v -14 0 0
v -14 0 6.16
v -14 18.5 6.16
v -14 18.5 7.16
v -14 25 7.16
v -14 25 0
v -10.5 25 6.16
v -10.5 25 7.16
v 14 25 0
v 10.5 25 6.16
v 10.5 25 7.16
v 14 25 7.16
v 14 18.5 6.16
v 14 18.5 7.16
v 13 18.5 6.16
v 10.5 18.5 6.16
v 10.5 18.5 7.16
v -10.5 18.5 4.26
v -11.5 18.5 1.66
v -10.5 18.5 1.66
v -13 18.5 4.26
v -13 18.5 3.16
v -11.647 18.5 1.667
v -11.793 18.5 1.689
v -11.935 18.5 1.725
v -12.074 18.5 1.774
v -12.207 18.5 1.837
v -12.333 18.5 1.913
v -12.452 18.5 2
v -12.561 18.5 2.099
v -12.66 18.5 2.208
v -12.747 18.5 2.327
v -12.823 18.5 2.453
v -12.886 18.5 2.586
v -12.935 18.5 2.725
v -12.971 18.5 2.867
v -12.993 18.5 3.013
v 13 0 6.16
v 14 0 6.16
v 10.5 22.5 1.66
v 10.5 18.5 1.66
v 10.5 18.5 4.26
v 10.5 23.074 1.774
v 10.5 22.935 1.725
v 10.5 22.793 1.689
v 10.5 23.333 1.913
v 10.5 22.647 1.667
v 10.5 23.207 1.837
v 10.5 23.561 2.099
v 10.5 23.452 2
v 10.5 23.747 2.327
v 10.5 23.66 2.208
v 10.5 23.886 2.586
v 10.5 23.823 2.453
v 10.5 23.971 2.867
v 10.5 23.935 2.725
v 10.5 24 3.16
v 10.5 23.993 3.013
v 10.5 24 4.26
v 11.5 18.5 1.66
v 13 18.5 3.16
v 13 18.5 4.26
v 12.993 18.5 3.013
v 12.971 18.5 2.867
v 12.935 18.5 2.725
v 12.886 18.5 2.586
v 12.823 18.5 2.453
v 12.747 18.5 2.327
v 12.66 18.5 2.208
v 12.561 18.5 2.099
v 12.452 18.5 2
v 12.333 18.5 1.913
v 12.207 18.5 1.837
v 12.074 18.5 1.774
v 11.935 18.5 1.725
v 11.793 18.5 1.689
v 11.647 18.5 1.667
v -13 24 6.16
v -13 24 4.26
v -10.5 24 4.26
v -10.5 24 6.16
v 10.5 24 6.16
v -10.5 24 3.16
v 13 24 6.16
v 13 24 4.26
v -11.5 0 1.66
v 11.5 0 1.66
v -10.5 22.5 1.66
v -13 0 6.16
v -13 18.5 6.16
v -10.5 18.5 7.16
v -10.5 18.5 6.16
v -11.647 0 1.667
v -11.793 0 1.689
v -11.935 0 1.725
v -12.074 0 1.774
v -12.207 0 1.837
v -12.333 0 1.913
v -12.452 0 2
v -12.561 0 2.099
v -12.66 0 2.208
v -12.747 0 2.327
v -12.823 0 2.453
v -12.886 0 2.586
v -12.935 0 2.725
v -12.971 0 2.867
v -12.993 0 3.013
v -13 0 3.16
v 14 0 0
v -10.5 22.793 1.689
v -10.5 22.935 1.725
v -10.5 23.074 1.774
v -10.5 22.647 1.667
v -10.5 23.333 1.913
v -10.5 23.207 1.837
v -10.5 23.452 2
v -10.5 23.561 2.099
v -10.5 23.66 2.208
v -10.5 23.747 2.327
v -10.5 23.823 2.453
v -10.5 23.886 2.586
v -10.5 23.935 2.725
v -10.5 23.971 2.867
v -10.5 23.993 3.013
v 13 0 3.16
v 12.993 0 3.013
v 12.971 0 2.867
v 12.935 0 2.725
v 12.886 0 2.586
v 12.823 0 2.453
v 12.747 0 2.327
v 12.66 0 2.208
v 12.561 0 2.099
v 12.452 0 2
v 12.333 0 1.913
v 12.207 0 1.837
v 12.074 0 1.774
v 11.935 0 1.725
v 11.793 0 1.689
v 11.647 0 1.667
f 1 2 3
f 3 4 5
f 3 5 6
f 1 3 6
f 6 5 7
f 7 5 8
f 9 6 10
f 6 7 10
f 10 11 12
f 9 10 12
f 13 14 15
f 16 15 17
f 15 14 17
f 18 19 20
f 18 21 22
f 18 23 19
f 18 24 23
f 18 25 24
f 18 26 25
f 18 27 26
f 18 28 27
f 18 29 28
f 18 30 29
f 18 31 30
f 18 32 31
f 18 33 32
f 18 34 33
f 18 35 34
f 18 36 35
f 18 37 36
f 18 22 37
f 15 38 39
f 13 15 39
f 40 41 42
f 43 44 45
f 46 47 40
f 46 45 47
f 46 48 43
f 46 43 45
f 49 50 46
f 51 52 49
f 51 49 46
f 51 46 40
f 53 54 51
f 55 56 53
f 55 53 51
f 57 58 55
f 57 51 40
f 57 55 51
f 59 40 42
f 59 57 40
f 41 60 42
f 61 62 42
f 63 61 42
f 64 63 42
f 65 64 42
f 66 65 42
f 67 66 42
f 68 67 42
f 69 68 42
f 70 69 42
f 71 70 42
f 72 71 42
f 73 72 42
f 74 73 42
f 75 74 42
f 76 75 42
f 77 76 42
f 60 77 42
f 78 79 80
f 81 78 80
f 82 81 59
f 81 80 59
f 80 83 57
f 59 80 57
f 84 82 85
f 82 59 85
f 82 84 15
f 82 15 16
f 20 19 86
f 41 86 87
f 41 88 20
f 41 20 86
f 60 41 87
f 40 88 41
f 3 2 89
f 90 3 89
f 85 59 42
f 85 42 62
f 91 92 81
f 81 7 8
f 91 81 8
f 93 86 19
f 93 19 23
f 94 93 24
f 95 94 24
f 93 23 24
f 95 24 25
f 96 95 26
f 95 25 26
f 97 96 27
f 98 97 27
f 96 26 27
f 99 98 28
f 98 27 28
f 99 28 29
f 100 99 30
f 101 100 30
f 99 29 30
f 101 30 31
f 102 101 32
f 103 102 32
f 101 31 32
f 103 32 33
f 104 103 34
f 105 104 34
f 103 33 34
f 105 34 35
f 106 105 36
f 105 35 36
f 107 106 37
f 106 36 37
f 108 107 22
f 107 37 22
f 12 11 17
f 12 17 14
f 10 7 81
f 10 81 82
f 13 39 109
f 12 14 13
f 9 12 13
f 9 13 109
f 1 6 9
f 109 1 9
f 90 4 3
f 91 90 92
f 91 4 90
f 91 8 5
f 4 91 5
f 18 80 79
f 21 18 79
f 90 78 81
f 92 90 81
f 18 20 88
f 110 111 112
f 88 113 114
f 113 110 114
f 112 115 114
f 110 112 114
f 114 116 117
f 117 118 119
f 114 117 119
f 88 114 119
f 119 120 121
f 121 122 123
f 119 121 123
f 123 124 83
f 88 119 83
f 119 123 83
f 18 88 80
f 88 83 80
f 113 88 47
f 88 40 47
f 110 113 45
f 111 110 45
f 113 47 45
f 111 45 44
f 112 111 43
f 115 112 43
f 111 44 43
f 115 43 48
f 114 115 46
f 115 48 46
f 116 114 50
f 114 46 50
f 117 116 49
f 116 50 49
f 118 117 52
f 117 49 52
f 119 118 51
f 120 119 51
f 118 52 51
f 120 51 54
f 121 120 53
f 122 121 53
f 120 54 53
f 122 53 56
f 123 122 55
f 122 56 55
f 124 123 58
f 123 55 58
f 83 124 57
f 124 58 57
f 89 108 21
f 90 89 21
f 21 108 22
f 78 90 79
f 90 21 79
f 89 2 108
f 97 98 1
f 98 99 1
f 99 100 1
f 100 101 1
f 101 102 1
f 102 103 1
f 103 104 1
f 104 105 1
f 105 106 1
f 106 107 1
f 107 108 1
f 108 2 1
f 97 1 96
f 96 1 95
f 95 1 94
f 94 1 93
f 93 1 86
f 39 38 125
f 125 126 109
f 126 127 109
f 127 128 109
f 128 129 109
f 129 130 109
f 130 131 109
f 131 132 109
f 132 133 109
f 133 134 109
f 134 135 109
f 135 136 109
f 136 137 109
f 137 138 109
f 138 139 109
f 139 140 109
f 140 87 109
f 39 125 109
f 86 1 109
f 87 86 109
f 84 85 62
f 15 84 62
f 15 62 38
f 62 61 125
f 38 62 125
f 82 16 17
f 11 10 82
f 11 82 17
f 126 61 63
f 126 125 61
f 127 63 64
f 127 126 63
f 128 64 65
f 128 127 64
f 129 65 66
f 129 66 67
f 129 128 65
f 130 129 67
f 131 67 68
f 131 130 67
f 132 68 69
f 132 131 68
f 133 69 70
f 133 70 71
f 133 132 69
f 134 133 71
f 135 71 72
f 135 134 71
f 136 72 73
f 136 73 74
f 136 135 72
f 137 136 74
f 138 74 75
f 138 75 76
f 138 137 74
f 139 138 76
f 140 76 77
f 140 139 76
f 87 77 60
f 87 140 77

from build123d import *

# Parameters (mm, degrees)
SKETCH_W     = 28
SKETCH_H     = 25
PAD_DEPTH    = 1.66
PAD001_DEPTH = 4.5
PAD002_DEPTH = 6.5
FILLET_R     = 1.5


with BuildPart() as part:
    # Sketch → Pad (new body)
    with BuildSketch(Plane.XY):
        with Locations((0, 12.5)):
            Rectangle(SKETCH_W, SKETCH_H)
    extrude(amount=PAD_DEPTH)

    # Sketch001 → Pad001 (new body)
    with BuildSketch(Plane.XY.offset(1.66)):
        Polygon((-14, 0), (-13, 0), (-13, 24), (13, 24), (13, 0), (14, 0), (14, 25), (-14, 25), align=None)
    extrude(amount=PAD001_DEPTH)

    # Sketch002 → Pad002 (new body)
    with BuildSketch(Plane(origin=(0, 25, 0), x_dir=(-1, 0, 0), z_dir=(0, 1, 0))):
        Polygon((-10.5, 6.16), (-10.5, 7.16), (-14, 7.16), (-14, 1.66), (-10.5, 1.66), (-10.5, 4.26), (-13, 4.26), (-13, 6.16), align=None)
    pad002 = extrude(amount=-PAD002_DEPTH)

    # Mirrored: Pad002 across Sketch002 V_Axis
    add(pad002.mirror(Plane(origin=(0, 25, 0), x_dir=(0, 1, 0), z_dir=(-1, 0, 0))))

    # Fillet
    fillet_edges = [part.edges().sort_by_distance(p)[0] for p in [
        (0, 24, 1.66),
        (13, 9.25, 1.66),
        (-13, 9.25, 1.66),
    ]]
    fillet(fillet_edges, radius=FILLET_R)


solid = part.part
